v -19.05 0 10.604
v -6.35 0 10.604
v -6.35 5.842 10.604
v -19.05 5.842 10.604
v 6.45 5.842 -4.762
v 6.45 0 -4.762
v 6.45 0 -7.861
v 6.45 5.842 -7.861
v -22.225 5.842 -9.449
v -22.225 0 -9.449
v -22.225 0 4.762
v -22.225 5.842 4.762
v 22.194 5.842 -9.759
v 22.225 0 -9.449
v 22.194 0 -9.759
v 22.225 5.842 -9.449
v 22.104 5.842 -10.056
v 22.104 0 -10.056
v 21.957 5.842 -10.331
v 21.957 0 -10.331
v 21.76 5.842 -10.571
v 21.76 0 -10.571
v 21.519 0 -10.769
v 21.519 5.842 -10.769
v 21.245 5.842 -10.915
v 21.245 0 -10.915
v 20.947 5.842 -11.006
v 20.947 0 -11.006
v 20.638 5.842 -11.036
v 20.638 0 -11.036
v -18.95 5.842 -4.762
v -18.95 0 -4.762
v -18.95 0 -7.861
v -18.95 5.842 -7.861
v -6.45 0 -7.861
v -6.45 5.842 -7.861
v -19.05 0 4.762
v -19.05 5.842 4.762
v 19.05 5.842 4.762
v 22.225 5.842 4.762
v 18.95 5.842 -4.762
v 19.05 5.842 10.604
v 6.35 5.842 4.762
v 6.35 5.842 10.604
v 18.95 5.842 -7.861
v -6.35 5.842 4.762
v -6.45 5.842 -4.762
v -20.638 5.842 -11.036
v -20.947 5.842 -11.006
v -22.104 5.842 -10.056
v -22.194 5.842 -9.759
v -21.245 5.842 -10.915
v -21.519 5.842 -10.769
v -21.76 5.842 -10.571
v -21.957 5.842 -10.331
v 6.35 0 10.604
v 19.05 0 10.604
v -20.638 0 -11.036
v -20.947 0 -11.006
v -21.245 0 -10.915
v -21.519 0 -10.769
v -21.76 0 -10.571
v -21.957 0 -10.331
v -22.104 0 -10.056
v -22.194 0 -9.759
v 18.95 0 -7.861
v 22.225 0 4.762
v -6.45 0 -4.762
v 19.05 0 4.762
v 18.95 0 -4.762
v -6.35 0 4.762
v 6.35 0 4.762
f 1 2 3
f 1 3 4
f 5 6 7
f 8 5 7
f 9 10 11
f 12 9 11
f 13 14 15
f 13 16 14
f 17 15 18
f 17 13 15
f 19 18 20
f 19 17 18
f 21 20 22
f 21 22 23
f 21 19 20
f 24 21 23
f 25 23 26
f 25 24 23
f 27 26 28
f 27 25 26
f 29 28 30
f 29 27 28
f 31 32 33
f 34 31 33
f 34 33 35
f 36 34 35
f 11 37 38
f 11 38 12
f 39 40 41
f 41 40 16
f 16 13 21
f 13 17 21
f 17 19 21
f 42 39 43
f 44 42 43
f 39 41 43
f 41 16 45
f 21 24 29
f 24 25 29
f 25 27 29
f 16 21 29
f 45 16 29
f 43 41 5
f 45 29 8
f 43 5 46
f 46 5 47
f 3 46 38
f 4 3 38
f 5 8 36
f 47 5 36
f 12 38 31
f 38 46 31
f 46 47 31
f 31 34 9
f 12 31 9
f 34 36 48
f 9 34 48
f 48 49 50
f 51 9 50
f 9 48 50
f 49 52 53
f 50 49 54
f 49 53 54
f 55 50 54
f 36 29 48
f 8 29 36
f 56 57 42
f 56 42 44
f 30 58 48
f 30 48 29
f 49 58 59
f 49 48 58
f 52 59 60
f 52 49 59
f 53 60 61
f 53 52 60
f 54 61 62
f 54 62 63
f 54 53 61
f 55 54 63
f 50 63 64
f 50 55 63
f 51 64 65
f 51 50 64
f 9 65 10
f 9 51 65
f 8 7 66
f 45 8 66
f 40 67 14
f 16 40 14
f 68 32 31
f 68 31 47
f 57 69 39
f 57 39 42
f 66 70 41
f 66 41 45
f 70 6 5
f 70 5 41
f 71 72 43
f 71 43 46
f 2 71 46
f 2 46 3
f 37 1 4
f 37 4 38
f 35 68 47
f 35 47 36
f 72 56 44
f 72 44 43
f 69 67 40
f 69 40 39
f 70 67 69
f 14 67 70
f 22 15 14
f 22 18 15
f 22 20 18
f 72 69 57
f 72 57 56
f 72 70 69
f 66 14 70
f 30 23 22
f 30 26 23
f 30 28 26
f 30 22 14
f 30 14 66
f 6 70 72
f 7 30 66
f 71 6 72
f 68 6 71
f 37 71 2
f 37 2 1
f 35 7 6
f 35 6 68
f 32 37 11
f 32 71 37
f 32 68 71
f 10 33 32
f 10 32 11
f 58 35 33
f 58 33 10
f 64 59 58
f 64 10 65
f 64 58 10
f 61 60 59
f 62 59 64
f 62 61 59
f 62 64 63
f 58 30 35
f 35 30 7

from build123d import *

# Parameters (mm, degrees)
SKETCH1_W           = 12.5
SKETCH1_H           = 3.0988
BOSS_EXTRUDE1_DEPTH = 5.842
FILLET1_R           = 1.5875


with BuildPart() as part:
    # Sketch1 → Boss-Extrude1 (new body)
    with BuildSketch(Plane(origin=(0, 0, 0), x_dir=(1, 0, 0), z_dir=(0, 1, 0))):
        Polygon((22.225, -4.7625), (19.05, -4.7625), (19.05, -10.6045), (6.35, -10.6045), (6.35, -4.7625), (-6.35, -4.7625), (-6.35, -10.6045), (-19.05, -10.6045), (-19.05, -4.7625), (-22.225, -4.7625), (-22.225, 4.7625), (-22.225, 7.8613), (-22.225, 11.0363), (22.225, 11.0363), (22.225, 7.8613), (22.225, 4.7625), align=None)
        with Locations((12.7, 6.3119)):
            Rectangle(SKETCH1_W, SKETCH1_H, mode=Mode.SUBTRACT)
        with Locations((-12.7, 6.3119)):
            Rectangle(SKETCH1_W, SKETCH1_H, mode=Mode.SUBTRACT)
    extrude(amount=BOSS_EXTRUDE1_DEPTH)

    # Fillet1
    fillet1_edges = [part.edges().sort_by_distance(p)[0] for p in [
        (-22.225, 2.921, -11.0363),
        (22.225, 2.921, -11.0363),
    ]]
    fillet(fillet1_edges, radius=FILLET1_R)


solid = part.part
